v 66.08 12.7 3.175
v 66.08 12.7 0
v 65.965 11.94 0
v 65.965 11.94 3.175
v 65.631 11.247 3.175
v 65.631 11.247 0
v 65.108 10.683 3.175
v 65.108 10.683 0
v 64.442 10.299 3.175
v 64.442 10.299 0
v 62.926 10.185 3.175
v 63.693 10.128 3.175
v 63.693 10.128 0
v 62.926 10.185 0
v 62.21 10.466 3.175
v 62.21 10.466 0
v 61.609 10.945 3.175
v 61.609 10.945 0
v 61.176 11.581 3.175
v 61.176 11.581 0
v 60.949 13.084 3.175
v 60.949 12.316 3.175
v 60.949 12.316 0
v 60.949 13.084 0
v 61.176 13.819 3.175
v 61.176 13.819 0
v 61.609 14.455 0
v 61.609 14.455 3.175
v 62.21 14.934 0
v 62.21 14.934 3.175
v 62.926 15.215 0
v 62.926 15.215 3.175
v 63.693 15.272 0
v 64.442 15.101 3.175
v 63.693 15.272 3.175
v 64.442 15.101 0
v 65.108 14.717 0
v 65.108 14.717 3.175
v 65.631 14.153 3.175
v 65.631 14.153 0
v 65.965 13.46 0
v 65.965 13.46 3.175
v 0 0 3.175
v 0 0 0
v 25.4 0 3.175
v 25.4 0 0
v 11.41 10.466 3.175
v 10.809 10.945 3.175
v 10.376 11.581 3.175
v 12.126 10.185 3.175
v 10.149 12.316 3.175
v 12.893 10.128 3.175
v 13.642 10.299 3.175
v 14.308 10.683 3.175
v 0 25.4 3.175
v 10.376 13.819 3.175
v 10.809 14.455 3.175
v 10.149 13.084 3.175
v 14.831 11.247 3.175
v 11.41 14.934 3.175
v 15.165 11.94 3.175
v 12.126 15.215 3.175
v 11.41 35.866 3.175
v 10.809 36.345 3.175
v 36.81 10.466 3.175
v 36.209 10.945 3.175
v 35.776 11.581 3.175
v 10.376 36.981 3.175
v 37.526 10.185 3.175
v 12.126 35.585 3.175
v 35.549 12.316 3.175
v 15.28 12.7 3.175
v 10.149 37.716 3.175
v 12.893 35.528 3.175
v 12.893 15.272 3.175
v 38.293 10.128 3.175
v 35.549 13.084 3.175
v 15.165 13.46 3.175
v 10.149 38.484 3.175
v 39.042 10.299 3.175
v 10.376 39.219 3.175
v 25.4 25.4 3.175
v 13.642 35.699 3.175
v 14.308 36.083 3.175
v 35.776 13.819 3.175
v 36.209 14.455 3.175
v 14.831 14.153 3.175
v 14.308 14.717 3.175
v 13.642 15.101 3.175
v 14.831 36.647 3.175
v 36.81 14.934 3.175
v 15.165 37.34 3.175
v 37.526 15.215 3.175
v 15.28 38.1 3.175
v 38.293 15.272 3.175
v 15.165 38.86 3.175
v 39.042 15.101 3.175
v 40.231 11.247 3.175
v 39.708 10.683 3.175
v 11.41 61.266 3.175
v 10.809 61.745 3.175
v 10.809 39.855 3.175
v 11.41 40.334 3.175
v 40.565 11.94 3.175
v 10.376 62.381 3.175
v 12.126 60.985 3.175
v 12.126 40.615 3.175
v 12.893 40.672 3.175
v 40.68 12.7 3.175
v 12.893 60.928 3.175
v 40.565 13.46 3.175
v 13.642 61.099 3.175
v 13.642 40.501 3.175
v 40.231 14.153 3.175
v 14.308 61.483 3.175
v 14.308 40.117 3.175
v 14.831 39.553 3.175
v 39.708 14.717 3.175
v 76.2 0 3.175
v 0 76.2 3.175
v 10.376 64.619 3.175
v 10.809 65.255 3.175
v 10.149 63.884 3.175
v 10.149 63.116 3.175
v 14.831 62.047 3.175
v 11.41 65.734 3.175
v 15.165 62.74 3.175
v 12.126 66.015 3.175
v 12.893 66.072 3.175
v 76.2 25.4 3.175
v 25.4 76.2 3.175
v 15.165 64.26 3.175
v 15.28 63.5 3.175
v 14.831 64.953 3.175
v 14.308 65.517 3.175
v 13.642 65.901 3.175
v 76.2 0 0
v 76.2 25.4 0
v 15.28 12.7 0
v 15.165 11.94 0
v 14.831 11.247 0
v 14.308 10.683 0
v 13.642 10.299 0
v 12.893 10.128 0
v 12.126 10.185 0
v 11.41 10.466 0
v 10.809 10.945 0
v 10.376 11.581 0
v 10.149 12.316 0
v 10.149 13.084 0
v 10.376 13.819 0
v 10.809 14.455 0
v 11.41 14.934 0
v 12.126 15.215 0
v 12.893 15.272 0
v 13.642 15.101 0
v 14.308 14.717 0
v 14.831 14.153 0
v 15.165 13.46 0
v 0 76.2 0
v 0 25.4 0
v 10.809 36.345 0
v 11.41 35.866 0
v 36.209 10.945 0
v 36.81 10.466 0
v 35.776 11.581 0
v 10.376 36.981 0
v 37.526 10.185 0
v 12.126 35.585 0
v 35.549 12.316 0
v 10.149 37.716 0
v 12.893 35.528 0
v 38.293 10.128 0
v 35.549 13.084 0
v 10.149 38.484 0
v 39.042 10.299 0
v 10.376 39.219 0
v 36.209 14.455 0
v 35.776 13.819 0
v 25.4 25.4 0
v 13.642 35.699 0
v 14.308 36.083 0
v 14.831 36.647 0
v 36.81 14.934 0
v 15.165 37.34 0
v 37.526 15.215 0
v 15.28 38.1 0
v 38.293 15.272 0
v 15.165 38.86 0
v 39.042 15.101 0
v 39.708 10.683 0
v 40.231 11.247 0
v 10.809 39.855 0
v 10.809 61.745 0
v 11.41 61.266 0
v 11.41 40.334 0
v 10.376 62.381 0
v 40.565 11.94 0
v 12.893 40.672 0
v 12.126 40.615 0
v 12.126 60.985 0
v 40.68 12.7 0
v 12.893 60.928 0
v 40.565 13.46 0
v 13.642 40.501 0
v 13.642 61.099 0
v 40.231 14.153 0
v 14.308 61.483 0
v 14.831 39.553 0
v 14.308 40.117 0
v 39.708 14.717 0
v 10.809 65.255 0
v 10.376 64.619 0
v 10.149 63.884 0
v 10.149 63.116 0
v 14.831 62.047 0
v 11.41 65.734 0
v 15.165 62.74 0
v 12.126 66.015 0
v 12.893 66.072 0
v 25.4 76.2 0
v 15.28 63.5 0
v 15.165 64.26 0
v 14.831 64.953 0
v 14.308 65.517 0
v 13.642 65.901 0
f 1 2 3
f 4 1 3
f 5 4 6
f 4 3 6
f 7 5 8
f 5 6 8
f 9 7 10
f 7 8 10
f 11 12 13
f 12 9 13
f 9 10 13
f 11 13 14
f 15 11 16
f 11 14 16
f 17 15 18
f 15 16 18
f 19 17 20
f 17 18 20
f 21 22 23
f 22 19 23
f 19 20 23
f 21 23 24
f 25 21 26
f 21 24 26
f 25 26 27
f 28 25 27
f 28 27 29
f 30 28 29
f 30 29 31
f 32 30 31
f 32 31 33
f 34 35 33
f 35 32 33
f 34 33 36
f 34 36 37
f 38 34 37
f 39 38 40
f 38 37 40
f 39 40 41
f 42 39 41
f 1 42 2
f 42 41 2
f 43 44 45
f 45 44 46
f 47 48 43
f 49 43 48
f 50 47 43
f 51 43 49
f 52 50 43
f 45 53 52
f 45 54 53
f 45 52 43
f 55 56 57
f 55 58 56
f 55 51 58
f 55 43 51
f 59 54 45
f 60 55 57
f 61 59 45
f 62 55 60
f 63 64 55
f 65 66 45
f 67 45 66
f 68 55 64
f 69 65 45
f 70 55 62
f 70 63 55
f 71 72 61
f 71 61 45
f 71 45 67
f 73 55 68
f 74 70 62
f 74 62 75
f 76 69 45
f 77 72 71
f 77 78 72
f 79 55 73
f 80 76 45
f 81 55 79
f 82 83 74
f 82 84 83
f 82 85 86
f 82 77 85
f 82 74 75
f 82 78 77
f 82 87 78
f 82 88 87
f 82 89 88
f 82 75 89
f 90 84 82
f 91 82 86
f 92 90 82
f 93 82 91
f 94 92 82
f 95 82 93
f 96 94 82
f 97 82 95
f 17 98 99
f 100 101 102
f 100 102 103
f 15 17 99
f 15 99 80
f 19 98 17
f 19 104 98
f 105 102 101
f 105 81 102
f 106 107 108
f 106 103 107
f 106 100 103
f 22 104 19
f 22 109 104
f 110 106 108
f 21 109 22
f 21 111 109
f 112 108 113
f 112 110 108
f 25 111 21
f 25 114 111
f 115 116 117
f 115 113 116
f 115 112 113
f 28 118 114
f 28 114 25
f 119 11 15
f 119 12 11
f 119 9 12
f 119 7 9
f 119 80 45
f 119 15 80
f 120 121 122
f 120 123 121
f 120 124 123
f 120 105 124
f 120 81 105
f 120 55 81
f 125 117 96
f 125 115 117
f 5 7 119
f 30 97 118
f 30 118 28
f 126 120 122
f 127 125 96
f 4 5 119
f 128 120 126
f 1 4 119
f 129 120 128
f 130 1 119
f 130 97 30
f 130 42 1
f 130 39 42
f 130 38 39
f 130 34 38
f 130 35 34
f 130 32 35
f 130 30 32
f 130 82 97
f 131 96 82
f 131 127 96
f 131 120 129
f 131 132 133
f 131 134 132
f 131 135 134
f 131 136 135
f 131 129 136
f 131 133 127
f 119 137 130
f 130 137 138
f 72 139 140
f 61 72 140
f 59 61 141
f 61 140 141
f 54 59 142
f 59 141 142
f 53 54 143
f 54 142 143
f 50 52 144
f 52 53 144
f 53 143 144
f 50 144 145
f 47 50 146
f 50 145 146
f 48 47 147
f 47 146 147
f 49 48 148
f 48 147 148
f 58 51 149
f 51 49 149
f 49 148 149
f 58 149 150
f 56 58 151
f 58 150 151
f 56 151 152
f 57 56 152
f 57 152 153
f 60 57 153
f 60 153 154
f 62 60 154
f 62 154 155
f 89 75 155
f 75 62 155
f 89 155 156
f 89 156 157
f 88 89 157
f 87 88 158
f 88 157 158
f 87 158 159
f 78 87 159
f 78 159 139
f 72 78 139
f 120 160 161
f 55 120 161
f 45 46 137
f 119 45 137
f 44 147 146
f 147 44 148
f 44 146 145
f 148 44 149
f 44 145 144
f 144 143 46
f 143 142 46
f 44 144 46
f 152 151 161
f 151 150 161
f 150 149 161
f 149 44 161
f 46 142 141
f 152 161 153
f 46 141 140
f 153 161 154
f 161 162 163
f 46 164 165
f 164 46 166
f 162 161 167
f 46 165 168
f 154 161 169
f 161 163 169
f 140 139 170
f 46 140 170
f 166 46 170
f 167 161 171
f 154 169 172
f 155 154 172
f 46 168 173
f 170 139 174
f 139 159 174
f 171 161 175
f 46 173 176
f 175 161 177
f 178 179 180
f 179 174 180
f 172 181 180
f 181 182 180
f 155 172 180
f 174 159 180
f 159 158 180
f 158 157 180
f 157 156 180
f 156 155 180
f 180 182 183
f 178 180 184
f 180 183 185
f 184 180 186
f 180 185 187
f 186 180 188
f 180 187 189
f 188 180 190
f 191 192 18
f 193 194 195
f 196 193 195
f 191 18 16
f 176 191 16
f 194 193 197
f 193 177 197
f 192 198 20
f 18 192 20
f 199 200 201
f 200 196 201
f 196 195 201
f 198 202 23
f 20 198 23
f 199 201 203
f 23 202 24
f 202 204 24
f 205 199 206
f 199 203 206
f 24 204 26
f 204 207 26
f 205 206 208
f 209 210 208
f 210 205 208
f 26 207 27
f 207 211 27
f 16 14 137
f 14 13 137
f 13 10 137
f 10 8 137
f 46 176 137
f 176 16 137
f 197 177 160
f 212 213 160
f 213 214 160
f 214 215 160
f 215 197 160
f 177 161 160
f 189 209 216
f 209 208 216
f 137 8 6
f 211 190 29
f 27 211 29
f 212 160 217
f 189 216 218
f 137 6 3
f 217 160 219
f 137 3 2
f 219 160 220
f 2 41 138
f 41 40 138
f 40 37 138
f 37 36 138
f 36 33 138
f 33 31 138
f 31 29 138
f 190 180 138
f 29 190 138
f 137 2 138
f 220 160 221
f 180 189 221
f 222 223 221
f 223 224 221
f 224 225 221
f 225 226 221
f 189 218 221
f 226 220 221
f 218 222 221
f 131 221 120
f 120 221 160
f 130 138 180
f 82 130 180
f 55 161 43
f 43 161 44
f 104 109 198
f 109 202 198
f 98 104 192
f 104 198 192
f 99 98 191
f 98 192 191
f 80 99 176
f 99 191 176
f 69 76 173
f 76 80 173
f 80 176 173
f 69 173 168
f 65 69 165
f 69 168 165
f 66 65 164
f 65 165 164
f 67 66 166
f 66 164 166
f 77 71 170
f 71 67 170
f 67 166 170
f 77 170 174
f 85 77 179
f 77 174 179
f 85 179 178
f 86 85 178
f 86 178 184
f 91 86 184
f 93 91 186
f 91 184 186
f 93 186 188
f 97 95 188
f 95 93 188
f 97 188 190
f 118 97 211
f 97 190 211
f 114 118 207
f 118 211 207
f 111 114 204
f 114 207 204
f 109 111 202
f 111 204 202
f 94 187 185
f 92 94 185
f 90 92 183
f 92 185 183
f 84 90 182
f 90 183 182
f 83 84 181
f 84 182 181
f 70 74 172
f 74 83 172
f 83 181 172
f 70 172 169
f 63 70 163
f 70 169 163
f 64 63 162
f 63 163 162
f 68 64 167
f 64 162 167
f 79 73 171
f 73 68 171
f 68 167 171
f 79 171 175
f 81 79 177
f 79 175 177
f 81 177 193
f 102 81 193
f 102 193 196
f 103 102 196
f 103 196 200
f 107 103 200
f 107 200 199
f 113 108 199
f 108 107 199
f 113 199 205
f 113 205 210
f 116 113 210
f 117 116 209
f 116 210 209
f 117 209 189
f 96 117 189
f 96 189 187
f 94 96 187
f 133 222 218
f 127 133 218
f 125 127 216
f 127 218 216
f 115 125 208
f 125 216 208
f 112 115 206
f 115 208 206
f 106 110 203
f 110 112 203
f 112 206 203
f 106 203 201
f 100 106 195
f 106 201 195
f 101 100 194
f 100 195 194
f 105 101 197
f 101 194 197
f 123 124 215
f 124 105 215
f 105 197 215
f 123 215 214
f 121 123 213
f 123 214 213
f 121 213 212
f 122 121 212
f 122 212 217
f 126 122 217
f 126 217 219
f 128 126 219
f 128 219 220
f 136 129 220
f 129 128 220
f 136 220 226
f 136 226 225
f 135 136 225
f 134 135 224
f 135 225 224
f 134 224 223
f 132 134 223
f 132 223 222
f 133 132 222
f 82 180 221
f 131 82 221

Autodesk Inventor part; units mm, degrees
ref_plane "YZ Plane" through (0, 0, 0) normal (1, 0, 0) x (0, 1, 0)
ref_plane "XZ Plane" through (0, 0, 0) normal (0, 1, 0) x (-1, 0, 0)
ref_plane "XY Plane" through (0, 0, 0) normal (0, 0, 1) x (1, 0, 0)
sketch "Sketch1" plane through (0, 0, 0) normal (0, 0, 1) x (1, 0, 0)
  line L0 (0, 0) -> (25.4, 0)
  line L1 (25.4, 25.4) -> (25.4, 76.2)
  line L2 (25.4, 76.2) -> (0, 76.2)
  line L3 (0, 76.2) -> (0, 0)
  line L4 (0, 0) -> (76.2, 0)
  line L5 (76.2, 0) -> (76.2, 25.4)
  line L6 (76.2, 25.4) -> (25.4, 25.4)
  line L7 (0, 25.4) -> (0, 0)
  line L8 (12.7, 76.2) -> (12.7, 63.5) construction
  line L9 (12.7, 63.5) -> (12.7, 38.1) construction
  line L10 (12.7, 38.1) -> (12.7, 12.7) construction
  line L11 (12.7, 12.7) -> (38.1, 12.7) construction
  line L12 (38.1, 12.7) -> (63.5, 12.7) construction
  circle A0 centre (12.7, 63.5) radius 2.5797
  circle A1 centre (12.7, 38.1) radius 2.5797
  circle A2 centre (12.7, 12.7) radius 2.5797
  circle A3 centre (38.1, 12.7) radius 2.5797
  circle A4 centre (63.5, 12.7) radius 2.5797
  dimension "d0" = 25.4
  dimension "d1" = 76.2
  dimension "d2" = 76.2
  dimension "d3" = 25.4
  dimension "d4" = 12.7
  dimension "d5" = 25.4
  dimension "d6" = 25.4
  dimension "d7" = 25.4
  dimension "d8" = 25.4
  dimension "d9" = 5.1594
extrude "Extrusion1" add sketch "Sketch1" along normal blind 3.175
properties part number "L-Guesset"
